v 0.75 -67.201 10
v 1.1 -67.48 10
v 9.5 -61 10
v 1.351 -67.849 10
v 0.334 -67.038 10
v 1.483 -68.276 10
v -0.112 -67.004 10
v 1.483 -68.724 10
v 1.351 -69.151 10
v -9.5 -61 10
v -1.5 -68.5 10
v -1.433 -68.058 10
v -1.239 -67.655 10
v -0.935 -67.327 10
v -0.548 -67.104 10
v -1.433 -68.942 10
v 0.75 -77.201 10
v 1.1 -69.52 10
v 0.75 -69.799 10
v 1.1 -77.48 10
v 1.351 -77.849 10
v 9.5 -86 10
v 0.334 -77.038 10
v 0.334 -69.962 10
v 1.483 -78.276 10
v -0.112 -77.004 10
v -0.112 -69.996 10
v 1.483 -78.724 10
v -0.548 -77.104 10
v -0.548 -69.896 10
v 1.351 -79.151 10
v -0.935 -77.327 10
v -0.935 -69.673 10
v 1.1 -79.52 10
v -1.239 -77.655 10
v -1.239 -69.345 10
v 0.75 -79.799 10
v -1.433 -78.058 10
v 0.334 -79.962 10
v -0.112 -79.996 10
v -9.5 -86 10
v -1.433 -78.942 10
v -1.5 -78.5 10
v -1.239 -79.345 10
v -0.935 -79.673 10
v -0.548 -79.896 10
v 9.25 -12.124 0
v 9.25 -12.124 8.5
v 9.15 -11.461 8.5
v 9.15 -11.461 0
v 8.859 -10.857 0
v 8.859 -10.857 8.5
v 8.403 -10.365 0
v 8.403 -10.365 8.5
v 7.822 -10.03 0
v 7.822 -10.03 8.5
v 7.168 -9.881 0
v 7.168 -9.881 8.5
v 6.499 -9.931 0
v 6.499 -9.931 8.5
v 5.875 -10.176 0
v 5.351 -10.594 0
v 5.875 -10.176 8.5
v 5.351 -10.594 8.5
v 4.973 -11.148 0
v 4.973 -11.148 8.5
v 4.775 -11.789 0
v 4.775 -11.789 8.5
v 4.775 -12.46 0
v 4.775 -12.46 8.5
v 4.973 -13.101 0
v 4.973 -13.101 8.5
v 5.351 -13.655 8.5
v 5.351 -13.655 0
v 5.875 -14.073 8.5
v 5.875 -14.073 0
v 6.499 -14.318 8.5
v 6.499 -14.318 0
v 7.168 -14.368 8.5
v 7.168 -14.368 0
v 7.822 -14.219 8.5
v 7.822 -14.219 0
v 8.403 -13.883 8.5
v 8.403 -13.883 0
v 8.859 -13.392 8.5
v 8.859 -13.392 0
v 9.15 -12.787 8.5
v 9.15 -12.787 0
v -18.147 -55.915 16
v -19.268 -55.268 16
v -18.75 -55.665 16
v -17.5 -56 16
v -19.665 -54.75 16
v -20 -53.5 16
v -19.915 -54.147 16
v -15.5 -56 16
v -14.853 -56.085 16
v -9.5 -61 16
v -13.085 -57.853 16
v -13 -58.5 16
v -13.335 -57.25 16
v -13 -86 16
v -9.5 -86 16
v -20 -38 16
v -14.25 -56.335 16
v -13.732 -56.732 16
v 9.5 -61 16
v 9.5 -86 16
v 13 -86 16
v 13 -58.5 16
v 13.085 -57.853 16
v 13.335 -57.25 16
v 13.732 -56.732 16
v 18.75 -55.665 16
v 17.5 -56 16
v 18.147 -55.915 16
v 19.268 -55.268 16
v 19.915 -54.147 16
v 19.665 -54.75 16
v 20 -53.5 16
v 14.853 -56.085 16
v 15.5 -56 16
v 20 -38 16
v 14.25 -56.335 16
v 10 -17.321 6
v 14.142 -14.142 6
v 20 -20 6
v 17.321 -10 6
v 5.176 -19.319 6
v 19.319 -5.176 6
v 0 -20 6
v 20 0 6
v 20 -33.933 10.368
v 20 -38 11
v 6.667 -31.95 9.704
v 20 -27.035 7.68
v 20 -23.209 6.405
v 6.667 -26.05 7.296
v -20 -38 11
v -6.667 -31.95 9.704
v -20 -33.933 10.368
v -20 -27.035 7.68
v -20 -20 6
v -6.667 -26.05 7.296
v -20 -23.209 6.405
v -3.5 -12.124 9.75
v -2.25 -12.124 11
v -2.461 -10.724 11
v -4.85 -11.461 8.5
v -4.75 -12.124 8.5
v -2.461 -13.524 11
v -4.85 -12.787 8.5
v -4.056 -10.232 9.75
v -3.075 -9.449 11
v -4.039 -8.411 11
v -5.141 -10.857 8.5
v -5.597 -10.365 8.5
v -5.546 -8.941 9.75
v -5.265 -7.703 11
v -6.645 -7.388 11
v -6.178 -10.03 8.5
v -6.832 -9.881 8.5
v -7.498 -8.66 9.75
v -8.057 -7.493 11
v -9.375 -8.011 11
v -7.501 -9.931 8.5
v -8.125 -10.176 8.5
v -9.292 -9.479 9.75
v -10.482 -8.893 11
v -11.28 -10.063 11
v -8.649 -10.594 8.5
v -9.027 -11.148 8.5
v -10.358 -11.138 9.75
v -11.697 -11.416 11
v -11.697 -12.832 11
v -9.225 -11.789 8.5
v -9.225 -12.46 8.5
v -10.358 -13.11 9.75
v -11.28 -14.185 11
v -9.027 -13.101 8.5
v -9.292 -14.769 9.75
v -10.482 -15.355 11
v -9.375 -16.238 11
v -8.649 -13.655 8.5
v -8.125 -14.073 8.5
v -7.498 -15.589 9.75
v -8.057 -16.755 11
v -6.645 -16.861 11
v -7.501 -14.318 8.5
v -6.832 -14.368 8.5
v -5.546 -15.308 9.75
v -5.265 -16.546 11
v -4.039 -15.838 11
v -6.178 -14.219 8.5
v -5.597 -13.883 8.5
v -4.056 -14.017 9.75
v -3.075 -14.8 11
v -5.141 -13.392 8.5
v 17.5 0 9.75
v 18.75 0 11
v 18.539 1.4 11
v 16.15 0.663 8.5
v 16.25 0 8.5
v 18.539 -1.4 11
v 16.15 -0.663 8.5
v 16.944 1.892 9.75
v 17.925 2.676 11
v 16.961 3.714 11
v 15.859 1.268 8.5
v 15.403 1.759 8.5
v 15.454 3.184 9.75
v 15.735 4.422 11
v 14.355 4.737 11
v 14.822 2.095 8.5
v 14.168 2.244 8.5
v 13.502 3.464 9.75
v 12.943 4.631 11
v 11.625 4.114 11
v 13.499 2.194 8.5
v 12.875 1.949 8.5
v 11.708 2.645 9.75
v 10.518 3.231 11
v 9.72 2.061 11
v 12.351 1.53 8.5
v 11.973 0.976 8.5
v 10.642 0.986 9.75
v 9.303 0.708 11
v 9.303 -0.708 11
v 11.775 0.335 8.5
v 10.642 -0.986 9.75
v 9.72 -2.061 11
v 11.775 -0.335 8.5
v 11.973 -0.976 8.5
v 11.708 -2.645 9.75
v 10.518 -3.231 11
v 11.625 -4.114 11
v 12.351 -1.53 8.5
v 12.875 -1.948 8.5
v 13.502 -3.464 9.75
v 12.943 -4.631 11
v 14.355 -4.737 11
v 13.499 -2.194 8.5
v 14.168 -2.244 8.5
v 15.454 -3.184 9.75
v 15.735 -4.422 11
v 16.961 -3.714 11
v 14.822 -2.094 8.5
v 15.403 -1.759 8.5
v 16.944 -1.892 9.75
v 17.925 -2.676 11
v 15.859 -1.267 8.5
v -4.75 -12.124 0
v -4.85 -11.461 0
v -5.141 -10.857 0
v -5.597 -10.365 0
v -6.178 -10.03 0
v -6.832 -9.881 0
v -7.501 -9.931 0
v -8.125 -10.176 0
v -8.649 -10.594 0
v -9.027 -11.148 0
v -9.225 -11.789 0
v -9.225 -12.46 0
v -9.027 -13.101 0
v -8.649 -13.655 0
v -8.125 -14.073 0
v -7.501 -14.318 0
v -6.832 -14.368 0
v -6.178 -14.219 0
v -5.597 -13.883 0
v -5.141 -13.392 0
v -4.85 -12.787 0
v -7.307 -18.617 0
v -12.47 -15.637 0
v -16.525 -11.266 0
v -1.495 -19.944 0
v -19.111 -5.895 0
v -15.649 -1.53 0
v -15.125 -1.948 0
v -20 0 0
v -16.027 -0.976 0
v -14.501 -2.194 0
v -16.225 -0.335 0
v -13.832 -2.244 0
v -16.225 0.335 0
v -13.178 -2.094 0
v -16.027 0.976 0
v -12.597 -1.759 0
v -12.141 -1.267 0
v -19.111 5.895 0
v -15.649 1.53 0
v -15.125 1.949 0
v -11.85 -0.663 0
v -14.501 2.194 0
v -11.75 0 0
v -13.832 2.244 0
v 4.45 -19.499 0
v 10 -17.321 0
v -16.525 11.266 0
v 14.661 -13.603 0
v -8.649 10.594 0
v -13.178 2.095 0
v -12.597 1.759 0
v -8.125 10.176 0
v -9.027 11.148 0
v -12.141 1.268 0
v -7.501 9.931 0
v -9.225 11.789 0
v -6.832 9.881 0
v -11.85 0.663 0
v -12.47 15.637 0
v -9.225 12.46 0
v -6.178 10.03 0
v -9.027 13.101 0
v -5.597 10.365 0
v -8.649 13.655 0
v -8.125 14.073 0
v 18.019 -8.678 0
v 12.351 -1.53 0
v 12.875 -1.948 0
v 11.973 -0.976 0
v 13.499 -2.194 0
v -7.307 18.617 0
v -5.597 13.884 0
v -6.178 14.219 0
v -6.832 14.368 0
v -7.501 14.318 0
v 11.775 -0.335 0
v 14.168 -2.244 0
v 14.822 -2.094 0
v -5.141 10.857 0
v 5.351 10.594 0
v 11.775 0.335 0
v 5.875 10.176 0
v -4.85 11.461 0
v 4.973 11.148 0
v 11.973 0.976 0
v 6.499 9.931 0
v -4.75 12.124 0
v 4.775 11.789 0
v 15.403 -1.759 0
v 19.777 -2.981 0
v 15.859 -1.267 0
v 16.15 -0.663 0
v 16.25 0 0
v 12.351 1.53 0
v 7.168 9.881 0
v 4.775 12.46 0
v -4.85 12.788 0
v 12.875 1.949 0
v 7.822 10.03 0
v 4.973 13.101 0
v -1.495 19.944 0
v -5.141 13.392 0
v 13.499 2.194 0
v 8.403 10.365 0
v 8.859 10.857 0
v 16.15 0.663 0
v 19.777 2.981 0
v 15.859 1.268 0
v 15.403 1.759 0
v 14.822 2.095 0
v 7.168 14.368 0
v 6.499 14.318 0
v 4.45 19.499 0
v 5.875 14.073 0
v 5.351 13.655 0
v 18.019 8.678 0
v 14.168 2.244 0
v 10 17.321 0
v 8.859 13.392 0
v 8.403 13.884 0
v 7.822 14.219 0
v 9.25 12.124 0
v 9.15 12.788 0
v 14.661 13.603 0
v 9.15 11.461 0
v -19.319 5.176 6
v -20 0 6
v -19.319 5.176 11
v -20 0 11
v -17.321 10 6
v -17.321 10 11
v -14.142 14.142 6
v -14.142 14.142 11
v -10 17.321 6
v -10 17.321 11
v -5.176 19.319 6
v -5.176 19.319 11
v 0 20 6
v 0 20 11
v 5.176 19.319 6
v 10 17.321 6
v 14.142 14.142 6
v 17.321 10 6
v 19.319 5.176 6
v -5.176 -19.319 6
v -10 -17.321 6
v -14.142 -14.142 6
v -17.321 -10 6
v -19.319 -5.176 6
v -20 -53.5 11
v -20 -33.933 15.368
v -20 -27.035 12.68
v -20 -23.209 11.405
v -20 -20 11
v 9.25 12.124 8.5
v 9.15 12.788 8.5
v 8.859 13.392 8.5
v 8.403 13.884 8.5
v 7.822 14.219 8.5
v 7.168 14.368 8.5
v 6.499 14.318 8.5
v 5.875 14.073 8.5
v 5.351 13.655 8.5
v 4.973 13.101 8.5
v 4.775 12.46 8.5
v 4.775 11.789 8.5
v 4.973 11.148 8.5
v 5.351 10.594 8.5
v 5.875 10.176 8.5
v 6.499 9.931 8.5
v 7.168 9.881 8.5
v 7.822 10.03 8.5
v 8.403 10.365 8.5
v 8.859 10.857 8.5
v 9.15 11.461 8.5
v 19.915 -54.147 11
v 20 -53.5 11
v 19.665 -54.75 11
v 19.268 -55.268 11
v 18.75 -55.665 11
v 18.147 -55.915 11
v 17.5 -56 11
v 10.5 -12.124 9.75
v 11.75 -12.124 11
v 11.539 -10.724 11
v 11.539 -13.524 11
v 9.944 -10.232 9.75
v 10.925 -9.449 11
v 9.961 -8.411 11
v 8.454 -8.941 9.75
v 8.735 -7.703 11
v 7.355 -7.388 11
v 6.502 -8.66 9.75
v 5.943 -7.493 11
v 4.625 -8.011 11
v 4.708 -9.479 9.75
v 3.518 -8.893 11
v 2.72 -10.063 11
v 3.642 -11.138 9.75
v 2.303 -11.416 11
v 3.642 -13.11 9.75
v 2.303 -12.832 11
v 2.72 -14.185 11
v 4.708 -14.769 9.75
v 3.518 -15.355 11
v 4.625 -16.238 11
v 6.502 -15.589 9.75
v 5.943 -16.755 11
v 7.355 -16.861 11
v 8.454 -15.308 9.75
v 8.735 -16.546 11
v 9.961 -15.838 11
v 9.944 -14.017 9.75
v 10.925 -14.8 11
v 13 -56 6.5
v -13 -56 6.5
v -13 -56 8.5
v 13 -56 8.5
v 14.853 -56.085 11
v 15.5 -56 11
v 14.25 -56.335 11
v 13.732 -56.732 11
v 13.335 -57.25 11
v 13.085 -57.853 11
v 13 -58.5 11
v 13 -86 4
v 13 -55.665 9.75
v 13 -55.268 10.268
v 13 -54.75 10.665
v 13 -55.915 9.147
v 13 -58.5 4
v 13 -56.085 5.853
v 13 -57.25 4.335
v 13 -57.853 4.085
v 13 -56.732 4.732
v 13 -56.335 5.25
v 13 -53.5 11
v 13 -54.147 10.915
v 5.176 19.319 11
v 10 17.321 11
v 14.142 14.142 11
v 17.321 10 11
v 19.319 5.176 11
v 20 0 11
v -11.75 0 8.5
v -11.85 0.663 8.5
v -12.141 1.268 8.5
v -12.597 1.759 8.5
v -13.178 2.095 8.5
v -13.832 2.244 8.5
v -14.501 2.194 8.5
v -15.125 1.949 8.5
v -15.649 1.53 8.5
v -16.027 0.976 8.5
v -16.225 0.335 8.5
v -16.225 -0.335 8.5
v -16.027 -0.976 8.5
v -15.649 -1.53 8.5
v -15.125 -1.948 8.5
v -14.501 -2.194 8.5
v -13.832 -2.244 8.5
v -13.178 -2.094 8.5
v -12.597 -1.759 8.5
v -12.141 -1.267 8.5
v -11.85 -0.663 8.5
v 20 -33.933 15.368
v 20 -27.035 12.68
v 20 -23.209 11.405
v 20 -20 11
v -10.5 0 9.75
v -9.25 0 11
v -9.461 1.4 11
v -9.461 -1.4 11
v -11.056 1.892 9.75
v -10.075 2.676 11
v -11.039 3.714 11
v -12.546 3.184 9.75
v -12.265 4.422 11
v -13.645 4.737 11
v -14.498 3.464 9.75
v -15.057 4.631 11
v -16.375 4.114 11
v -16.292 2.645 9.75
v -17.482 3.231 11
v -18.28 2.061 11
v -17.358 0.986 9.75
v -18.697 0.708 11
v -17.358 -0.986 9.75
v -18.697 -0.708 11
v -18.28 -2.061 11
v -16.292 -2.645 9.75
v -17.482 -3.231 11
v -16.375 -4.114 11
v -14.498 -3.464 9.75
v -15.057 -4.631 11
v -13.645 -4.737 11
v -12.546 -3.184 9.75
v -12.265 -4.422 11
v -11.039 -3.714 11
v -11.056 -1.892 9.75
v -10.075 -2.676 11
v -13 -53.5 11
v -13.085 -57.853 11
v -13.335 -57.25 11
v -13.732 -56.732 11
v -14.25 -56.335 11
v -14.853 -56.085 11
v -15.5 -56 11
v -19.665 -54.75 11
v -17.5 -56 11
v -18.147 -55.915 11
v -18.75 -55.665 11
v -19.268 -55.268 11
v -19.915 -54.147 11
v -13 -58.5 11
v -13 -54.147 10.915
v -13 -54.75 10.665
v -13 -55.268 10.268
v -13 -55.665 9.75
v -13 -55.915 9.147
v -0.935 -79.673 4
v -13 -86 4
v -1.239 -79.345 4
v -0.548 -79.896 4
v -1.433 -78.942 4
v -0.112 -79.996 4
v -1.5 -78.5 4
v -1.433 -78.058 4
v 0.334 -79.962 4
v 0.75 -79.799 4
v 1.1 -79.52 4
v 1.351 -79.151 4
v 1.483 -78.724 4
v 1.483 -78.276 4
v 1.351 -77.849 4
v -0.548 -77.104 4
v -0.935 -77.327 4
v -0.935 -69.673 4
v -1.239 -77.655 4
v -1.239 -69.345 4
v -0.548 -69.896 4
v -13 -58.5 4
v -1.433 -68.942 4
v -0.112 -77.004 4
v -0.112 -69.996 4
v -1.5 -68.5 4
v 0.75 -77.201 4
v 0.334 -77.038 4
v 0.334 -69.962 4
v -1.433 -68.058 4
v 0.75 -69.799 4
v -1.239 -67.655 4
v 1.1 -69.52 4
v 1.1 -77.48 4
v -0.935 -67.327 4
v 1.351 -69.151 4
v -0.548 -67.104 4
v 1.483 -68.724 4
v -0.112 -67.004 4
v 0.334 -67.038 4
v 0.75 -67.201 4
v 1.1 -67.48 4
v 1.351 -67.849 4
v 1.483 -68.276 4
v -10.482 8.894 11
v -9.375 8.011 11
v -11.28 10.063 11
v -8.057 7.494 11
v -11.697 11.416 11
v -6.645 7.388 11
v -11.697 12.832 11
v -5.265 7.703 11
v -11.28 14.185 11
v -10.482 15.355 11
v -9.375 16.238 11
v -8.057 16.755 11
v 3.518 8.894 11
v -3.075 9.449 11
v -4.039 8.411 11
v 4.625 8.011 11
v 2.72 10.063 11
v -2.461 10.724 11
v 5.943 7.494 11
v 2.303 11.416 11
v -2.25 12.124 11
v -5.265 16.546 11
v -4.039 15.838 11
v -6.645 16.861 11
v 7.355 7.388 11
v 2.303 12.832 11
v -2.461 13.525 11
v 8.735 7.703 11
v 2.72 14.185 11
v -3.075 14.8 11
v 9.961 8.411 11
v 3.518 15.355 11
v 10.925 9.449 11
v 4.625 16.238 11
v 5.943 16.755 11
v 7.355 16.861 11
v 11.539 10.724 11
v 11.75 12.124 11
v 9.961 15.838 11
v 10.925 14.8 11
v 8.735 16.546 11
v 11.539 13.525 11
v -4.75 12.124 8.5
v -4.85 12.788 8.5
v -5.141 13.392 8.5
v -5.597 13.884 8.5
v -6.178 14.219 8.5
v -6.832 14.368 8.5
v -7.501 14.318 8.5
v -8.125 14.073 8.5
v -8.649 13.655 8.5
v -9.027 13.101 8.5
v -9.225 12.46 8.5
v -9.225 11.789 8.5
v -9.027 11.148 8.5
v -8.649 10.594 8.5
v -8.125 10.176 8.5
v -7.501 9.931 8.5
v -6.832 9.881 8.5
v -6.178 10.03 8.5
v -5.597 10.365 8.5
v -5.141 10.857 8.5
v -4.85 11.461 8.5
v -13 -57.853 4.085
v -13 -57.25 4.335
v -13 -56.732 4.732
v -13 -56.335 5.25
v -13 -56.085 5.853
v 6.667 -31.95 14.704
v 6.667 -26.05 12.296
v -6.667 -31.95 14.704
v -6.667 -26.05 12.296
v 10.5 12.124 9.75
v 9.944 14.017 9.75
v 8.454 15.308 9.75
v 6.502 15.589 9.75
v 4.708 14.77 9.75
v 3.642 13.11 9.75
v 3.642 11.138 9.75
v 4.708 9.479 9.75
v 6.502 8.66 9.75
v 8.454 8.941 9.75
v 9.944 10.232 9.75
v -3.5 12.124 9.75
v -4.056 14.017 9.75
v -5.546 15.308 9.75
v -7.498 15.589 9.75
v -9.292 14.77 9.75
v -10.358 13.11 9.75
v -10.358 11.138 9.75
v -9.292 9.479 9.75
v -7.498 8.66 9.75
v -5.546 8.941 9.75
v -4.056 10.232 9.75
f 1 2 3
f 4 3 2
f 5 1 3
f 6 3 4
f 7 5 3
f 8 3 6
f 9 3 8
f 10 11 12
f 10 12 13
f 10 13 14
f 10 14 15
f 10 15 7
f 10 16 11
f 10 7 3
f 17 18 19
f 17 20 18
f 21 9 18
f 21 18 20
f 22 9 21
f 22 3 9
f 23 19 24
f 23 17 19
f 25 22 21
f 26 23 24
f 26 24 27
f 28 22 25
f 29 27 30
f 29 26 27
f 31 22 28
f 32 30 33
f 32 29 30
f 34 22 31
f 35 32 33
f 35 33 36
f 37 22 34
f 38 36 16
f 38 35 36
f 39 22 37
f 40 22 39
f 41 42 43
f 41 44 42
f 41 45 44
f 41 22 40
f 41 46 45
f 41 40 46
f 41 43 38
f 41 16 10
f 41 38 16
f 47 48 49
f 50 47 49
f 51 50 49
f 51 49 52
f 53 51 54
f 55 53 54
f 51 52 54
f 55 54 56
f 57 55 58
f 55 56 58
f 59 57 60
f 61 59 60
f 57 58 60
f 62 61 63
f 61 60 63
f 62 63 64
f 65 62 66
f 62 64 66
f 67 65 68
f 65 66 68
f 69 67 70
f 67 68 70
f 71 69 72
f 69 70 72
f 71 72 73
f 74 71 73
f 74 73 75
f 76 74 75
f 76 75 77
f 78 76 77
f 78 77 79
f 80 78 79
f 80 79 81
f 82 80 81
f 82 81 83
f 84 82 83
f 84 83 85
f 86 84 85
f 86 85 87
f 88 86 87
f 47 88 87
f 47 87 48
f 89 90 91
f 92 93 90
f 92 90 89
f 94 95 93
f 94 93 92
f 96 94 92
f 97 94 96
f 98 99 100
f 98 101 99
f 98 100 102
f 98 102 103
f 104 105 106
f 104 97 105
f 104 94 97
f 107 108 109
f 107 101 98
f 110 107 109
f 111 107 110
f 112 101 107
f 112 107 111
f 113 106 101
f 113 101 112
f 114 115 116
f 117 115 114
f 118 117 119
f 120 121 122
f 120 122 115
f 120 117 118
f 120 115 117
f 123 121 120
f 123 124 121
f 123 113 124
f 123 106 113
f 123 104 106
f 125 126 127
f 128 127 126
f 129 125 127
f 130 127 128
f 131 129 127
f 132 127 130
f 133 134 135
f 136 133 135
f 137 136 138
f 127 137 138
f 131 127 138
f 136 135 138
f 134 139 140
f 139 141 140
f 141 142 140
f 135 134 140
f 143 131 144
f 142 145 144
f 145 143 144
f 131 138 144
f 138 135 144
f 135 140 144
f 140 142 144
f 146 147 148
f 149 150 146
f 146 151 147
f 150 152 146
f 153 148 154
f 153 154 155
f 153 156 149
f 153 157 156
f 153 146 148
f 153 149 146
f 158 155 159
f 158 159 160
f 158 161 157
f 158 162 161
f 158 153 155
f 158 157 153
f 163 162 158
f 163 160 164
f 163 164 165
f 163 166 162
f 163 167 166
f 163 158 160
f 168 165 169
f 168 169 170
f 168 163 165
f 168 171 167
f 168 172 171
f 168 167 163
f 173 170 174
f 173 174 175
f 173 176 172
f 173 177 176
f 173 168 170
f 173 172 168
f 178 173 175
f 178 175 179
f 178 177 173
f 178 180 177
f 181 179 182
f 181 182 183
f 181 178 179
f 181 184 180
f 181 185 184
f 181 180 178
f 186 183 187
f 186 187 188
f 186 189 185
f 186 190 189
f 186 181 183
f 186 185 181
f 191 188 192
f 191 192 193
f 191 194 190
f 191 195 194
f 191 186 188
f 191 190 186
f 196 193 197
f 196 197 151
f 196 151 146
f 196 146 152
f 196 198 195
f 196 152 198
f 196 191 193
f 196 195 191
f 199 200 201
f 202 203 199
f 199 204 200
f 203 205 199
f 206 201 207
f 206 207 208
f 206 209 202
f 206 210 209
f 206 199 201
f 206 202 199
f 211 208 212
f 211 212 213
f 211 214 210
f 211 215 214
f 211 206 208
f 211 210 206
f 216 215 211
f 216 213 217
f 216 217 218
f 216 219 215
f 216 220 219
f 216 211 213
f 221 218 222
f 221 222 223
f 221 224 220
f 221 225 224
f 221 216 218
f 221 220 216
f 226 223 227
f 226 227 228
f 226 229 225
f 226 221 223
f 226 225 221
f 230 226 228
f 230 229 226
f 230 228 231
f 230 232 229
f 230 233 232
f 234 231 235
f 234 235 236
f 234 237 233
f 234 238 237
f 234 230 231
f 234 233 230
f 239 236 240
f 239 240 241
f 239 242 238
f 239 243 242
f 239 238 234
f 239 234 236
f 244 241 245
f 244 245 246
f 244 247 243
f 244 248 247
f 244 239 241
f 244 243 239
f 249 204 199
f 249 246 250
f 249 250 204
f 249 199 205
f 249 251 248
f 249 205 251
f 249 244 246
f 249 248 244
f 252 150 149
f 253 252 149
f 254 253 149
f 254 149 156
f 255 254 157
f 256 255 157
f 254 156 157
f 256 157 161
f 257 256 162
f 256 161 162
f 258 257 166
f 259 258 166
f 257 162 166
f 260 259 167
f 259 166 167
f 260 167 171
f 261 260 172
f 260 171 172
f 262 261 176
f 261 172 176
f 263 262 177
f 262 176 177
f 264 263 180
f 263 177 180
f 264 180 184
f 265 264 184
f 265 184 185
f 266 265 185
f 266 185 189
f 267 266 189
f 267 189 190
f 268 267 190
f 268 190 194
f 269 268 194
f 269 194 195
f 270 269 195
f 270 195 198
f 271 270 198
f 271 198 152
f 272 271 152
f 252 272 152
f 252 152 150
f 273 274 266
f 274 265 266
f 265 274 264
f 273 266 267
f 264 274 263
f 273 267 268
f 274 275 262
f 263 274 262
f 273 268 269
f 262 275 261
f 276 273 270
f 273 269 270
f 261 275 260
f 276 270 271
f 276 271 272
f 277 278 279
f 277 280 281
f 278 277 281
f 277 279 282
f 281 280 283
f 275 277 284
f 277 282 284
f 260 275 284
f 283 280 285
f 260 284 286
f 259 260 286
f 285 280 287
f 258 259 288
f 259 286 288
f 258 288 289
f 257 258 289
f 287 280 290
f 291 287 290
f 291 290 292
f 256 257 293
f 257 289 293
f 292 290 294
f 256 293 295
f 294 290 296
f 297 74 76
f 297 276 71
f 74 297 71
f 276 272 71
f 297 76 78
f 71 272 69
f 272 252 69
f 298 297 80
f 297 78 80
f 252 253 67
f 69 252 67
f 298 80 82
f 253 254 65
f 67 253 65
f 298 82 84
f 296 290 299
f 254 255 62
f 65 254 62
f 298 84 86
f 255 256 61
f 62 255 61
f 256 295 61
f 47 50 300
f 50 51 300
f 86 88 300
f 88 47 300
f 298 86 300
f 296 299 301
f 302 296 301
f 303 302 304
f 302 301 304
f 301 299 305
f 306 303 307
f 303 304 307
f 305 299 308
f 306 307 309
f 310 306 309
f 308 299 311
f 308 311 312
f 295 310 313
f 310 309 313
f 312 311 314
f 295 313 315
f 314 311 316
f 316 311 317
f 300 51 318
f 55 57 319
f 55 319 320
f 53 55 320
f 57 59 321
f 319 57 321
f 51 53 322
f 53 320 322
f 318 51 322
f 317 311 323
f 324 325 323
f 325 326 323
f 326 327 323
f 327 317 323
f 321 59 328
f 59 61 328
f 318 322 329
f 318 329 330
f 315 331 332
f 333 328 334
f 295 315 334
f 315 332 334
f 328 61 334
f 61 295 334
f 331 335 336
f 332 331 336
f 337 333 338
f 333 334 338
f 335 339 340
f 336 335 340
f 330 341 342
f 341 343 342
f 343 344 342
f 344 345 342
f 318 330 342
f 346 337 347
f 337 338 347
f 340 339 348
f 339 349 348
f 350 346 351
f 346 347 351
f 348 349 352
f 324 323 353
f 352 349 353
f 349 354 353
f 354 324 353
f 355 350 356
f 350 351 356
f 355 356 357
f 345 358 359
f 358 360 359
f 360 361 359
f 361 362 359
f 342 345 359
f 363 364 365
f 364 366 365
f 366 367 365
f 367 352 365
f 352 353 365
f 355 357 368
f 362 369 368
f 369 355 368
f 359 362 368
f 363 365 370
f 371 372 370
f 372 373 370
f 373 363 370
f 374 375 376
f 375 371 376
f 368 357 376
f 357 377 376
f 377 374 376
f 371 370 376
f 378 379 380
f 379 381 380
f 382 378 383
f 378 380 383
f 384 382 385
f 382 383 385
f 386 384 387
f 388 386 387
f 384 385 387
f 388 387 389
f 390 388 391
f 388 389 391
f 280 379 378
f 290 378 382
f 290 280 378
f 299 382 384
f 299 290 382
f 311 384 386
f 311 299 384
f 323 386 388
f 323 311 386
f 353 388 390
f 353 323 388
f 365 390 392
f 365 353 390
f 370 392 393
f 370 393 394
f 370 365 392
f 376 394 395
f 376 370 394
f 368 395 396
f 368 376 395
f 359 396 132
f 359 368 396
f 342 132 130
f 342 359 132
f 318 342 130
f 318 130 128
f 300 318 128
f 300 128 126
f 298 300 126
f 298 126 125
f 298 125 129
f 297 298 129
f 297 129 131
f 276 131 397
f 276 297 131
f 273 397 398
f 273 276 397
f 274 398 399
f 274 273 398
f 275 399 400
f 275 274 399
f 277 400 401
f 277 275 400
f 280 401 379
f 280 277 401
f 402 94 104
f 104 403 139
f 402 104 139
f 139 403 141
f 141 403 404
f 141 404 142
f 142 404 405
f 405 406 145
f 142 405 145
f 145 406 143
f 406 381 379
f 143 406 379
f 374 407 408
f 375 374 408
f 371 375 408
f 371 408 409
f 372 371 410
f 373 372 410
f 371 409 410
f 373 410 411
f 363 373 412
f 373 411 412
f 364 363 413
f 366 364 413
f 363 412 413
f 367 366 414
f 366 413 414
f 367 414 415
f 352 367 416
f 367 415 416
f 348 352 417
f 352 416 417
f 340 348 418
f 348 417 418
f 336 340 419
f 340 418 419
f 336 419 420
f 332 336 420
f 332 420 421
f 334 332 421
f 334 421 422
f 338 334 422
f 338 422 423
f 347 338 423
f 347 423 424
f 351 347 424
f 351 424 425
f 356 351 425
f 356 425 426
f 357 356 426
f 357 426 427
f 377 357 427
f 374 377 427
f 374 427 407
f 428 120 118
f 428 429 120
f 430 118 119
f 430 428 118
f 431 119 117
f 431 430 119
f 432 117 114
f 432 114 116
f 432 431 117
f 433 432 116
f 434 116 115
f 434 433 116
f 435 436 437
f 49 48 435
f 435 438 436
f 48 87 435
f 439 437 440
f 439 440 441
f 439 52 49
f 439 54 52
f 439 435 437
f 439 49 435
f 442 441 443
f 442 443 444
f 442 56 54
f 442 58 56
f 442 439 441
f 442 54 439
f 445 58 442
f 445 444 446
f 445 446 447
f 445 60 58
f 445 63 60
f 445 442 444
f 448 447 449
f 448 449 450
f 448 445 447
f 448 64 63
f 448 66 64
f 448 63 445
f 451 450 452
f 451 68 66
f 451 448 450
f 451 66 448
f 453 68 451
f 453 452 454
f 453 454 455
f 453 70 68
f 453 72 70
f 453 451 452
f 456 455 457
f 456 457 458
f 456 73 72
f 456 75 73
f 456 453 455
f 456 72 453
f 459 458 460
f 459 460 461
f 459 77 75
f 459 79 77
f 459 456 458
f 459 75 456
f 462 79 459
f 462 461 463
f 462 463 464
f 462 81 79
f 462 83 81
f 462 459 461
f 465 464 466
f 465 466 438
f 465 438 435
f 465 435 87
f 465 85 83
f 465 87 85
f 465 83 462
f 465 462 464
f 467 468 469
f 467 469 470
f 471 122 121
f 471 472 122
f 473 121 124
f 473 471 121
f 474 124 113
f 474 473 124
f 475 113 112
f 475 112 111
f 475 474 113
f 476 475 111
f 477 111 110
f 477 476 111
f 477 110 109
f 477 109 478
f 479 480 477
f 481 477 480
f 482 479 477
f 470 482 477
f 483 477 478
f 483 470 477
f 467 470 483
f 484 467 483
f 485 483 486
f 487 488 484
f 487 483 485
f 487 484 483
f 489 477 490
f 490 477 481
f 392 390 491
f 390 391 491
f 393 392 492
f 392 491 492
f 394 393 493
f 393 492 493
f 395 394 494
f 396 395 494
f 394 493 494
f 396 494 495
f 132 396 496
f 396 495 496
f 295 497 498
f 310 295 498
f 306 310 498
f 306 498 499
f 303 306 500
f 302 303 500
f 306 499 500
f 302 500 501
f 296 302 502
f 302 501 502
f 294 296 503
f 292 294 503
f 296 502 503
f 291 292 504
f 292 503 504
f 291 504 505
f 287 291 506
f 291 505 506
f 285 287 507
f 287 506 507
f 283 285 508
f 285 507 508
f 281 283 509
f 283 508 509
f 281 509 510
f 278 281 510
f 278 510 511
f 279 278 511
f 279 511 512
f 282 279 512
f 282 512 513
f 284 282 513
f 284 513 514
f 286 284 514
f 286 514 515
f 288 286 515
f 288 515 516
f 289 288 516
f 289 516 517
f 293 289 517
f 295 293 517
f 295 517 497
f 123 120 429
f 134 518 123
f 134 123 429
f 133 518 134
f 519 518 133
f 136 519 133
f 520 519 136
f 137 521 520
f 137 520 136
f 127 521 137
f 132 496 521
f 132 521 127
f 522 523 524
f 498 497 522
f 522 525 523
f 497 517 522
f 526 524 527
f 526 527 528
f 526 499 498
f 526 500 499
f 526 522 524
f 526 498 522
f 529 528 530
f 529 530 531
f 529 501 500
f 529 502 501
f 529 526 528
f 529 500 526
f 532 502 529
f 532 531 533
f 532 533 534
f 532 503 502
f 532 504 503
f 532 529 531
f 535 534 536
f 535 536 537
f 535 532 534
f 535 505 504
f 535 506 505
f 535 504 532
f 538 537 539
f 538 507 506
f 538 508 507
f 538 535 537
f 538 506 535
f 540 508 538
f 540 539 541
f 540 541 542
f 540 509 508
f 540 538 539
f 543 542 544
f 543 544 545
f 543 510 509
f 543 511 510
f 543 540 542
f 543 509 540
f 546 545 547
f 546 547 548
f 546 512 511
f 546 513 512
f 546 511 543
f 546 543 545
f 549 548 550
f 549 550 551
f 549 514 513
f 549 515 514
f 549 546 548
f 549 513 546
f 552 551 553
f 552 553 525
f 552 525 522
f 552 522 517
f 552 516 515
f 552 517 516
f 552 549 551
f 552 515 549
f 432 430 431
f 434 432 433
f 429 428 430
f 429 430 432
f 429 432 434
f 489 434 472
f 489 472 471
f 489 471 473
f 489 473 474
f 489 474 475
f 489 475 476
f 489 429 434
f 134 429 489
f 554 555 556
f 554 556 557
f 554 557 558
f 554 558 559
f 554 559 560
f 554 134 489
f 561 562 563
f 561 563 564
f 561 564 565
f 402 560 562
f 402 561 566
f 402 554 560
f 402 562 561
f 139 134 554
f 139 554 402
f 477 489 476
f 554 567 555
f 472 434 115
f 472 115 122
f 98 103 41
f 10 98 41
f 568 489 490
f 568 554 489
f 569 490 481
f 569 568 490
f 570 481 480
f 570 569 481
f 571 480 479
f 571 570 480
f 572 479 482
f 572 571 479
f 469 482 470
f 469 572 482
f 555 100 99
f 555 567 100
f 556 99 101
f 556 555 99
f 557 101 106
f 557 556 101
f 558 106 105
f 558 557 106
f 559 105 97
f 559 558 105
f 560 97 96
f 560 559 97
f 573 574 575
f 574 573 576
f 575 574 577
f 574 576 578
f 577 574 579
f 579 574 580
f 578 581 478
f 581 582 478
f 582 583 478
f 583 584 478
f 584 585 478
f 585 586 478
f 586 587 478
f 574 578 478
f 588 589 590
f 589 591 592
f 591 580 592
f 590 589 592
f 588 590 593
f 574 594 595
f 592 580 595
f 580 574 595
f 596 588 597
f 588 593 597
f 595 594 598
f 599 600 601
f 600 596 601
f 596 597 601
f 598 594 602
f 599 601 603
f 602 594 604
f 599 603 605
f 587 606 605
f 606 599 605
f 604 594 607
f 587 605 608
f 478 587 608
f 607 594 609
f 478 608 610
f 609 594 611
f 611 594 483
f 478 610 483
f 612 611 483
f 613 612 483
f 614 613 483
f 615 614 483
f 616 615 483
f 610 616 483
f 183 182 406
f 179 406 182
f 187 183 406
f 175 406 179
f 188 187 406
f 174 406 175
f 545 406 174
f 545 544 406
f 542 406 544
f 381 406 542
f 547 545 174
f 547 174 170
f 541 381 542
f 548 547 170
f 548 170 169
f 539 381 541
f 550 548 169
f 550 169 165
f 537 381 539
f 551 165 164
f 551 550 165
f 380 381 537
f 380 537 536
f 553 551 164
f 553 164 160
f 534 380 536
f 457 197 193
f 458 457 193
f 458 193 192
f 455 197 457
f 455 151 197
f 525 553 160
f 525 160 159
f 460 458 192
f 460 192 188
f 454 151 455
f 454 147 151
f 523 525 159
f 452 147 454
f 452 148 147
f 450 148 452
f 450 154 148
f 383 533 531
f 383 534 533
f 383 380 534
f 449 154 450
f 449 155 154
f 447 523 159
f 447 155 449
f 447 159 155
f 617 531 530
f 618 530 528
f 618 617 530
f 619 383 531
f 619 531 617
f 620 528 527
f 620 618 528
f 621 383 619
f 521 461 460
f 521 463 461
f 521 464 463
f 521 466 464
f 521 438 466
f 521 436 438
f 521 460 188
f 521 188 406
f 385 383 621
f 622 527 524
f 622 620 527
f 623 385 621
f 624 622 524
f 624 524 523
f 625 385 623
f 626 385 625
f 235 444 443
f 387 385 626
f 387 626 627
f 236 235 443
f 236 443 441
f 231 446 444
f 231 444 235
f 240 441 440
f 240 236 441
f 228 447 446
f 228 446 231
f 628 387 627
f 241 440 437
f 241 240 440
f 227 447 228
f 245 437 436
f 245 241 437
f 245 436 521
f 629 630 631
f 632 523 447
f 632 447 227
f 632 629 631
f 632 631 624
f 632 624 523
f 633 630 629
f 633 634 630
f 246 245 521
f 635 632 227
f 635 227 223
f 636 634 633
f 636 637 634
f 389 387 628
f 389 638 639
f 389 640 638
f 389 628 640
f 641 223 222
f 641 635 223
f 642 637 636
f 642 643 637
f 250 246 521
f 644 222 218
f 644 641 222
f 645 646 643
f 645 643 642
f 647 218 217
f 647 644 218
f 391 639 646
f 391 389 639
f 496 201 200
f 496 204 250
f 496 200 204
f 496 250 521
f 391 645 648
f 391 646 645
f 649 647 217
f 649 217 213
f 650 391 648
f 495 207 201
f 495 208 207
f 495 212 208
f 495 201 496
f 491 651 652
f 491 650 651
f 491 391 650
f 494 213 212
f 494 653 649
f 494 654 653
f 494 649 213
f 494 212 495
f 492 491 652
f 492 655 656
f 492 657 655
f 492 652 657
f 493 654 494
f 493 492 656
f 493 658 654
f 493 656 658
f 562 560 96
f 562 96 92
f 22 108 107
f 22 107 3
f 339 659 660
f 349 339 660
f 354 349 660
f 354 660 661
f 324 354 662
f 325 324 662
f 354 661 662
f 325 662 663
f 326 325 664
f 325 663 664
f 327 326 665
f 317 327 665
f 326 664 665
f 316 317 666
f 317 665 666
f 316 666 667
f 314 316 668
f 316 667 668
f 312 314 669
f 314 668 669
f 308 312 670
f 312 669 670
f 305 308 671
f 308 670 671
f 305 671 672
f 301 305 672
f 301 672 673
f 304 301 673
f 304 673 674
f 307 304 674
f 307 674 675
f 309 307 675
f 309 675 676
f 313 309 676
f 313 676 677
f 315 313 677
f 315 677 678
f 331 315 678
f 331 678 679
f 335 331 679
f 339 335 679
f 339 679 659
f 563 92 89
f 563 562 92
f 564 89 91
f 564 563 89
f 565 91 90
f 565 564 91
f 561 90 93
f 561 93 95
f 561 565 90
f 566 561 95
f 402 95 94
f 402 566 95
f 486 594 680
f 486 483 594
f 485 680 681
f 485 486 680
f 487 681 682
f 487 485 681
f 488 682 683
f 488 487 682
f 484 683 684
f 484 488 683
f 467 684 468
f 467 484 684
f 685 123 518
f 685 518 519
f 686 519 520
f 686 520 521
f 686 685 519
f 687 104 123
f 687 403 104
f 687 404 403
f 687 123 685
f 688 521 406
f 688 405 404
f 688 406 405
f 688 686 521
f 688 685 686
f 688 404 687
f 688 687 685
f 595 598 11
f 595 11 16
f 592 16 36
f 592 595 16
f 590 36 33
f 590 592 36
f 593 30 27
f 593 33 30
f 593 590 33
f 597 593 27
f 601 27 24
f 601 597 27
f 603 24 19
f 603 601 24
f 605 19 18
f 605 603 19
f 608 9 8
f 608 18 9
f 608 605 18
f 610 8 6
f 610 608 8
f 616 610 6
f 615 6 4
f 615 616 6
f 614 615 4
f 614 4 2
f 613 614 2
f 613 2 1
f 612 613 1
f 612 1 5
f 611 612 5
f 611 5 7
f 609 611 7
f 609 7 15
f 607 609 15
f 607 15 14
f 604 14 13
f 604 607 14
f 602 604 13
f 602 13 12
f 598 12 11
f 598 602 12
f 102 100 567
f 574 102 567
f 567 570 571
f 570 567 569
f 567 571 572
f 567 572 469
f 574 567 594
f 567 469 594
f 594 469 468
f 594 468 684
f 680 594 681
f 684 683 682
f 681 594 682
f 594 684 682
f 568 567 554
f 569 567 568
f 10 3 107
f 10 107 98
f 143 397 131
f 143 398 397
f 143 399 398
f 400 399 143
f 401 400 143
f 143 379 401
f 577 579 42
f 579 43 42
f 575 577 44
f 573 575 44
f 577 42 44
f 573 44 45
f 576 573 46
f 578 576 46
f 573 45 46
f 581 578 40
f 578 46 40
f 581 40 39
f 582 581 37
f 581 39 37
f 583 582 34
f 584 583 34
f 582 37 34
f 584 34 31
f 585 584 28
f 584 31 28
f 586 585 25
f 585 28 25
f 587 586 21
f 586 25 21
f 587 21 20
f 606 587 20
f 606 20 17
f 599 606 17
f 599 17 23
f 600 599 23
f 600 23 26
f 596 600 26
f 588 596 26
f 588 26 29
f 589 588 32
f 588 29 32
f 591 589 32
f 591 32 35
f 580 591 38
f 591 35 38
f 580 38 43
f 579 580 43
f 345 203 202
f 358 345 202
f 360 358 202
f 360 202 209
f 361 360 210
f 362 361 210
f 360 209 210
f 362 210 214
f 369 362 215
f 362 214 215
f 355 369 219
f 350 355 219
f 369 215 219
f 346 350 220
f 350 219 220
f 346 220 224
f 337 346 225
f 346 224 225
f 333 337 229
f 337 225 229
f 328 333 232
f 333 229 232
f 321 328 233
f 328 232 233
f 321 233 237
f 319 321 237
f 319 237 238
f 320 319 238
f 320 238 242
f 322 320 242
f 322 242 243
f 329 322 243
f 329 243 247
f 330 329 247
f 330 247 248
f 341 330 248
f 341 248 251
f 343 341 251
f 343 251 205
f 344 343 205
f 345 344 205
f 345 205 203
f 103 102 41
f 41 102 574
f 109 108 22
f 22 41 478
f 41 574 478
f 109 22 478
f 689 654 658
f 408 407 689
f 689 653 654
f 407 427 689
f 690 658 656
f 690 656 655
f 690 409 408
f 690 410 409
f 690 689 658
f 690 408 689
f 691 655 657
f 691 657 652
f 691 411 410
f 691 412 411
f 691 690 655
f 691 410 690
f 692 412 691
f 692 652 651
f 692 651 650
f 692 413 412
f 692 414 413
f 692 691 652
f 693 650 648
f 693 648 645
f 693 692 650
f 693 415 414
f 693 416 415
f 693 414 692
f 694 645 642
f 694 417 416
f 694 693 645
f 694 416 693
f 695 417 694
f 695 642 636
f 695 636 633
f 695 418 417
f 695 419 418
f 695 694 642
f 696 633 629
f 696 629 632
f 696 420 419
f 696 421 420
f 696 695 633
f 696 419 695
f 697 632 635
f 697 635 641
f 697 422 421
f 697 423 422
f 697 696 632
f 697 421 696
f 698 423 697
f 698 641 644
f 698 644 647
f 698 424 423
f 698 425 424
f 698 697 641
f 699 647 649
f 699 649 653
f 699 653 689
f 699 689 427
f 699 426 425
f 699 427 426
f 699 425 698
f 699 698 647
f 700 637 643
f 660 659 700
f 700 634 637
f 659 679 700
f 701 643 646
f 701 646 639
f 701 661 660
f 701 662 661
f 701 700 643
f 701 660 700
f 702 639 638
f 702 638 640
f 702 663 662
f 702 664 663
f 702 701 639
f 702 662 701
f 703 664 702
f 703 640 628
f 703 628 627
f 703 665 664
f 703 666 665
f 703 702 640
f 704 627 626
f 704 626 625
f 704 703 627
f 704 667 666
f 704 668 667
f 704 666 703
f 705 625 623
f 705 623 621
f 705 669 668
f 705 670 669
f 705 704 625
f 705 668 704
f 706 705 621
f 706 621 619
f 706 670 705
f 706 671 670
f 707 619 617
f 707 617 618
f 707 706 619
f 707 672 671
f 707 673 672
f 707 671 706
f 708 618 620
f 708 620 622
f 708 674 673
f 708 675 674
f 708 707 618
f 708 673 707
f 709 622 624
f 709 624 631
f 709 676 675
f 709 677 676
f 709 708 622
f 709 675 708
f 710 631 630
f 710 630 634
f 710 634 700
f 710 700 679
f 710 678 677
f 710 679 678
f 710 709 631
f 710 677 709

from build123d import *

# Parameters (mm, degrees)
SKETCH7_W           = 40
SKETCH7_H           = 40
BOSS_EXTRUDE1_DEPTH = 11
LOFT1_START         = -20
LOFT1_DEPTH         = 40
SKETCH16_W          = 49.026286786
SKETCH16_H          = 65.242270374
SKETCH16_R          = 20
CUT_EXTRUDE3_DEPTH  = 6
SKETCH17_W          = 40
SKETCH17_H          = 5
BOSS_EXTRUDE5_DEPTH = 18
SKETCH10_R          = 2.25
CUT_EXTRUDE1_DEPTH  = 25
CHAMFER1_SIZE       = 2.5
FILLET3_R           = 20
SKETCH11_W          = 26
SKETCH11_H          = 12
BOSS_EXTRUDE6_DEPTH = 30
SKETCH21_W          = 19
SKETCH21_H          = 6
CUT_EXTRUDE4_DEPTH  = 25
FILLET5_R           = 2.5
FILLET7_R           = 2.5
SKETCH22_R          = 1.5
CUT_EXTRUDE5_DEPTH  = 12.5


# Read off the part's stored shape, not the designer's step: Loft1
with BuildPart() as part:
    # Sketch7 → Boss-Extrude1 (new body)
    with BuildSketch(Plane.XY):
        Rectangle(SKETCH7_W, SKETCH7_H)
    extrude(amount=BOSS_EXTRUDE1_DEPTH)

    # Loft1 outline → Loft1 (add)
    with BuildSketch(Plane.YZ.offset(LOFT1_START)):
        with BuildLine():
            add(Edge.make_bspline(
                [(-38, 16), (-31.772819436, 16), (-26.227180564, 11), (-20, 11)],
                knots=[0, 0, 0, 0, 1, 1, 1, 1], degree=3))
            Line((-38, 16), (-38, 11))
            add(Edge.make_bspline(
                [(-38, 11), (-31.772819436, 11), (-26.227180564, 6), (-20, 6)],
                knots=[0, 0, 0, 0, 1, 1, 1, 1], degree=3))
            Line((-20, 6), (-20, 11))
        make_face()
    extrude(amount=LOFT1_DEPTH)

    # Sketch16 → Cut-Extrude3 (cut)
    with BuildSketch(Plane(origin=(0, 0, 0), x_dir=(-1, 0, 0), z_dir=(0, 0, -1))):
        Rectangle(SKETCH16_W, SKETCH16_H)
        Circle(SKETCH16_R, mode=Mode.SUBTRACT)
    extrude(amount=-CUT_EXTRUDE3_DEPTH, mode=Mode.SUBTRACT)

    # Sketch17 → Boss-Extrude5 (add)
    with BuildSketch(Plane(origin=(0, -38, 0), x_dir=(-1, 0, 0), z_dir=(0, -1, 0))):
        with Locations((0, -13.5)):
            Rectangle(SKETCH17_W, SKETCH17_H)
    extrude(amount=BOSS_EXTRUDE5_DEPTH)

    # Sketch10 → Cut-Extrude1 (cut)
    with BuildSketch(Plane.XY.offset(11)):
        with Locations((-7.00009521, 12.124420806)):
            Circle(SKETCH10_R)
        with Locations((6.99990479, 12.124420806)):
            Circle(SKETCH10_R)
        with Locations((13.99990479, 6.5153e-05)):
            Circle(SKETCH10_R)
        with Locations((6.99990479, -12.1242905)):
            Circle(SKETCH10_R)
        with Locations((-7.00009521, -12.1242905)):
            Circle(SKETCH10_R)
        with Locations((-14.00009521, 6.5153e-05)):
            Circle(SKETCH10_R)
    extrude(amount=-CUT_EXTRUDE1_DEPTH, mode=Mode.SUBTRACT)

    # Chamfer1
    chamfer1_edges = [part.edges().sort_by_distance(p)[0] for p in [
        (4.74990479, 12.124420806, 11),
        (-9.25009521, 12.124420806, 11),
        (-16.25009521, 6.5153e-05, 11),
        (-9.25009521, -12.1242905, 11),
        (4.74990479, -12.1242905, 11),
        (11.74990479, 6.5153e-05, 11),
    ]]
    chamfer(chamfer1_edges, length=CHAMFER1_SIZE)

    # Fillet3
    fillet3_edges = [part.edges().sort_by_distance(p)[0] for p in [
        (20, 20, 8.5),
        (-20, 20, 8.5),
    ]]
    fillet(fillet3_edges, radius=FILLET3_R - 0.0001)  # a hair under: the kernel refuses the full size

    # Sketch11 → Boss-Extrude6 (add)
    with BuildSketch(Plane(origin=(0, -56, -3.472963553), x_dir=(1, 0, 0), z_dir=(0, 1, 0))):
        with Locations((0, -13.472963553)):
            Rectangle(SKETCH11_W, SKETCH11_H)
    extrude(amount=-BOSS_EXTRUDE6_DEPTH)

    # Sketch21 → Cut-Extrude4 (cut)
    with BuildSketch(Plane(origin=(0, -86, 0), x_dir=(-1, 0, 0), z_dir=(0, -1, 0))):
        with Locations((0, -13)):
            Rectangle(SKETCH21_W, SKETCH21_H)
    extrude(amount=-CUT_EXTRUDE4_DEPTH, mode=Mode.SUBTRACT)

    # Fillet5
    fillet5_edges = [part.edges().sort_by_distance(p)[0] for p in [
        (-13, -56, 13.5),
        (-20, -56, 13.5),
        (13, -56, 13.5),
        (20, -56, 13.5),
    ]]
    fillet(fillet5_edges, radius=FILLET5_R)

    # Fillet7
    fillet7_edges = [part.edges().sort_by_distance(p)[0] for p in [
        (0, -56, 11),
        (0, -56, 4),
    ]]
    fillet(fillet7_edges, radius=FILLET7_R)

    # Sketch22 → Cut-Extrude5 (cut, symmetric)
    with BuildSketch(Plane.XY):
        with Locations(Location((0, -68.5, 0), (0, 0, 180))):
            Circle(SKETCH22_R)
        with Locations(Location((0, -78.5, 0), (0, 0, 180))):
            Circle(SKETCH22_R)
    extrude(amount=CUT_EXTRUDE5_DEPTH, both=True, mode=Mode.SUBTRACT)


solid = part.part
